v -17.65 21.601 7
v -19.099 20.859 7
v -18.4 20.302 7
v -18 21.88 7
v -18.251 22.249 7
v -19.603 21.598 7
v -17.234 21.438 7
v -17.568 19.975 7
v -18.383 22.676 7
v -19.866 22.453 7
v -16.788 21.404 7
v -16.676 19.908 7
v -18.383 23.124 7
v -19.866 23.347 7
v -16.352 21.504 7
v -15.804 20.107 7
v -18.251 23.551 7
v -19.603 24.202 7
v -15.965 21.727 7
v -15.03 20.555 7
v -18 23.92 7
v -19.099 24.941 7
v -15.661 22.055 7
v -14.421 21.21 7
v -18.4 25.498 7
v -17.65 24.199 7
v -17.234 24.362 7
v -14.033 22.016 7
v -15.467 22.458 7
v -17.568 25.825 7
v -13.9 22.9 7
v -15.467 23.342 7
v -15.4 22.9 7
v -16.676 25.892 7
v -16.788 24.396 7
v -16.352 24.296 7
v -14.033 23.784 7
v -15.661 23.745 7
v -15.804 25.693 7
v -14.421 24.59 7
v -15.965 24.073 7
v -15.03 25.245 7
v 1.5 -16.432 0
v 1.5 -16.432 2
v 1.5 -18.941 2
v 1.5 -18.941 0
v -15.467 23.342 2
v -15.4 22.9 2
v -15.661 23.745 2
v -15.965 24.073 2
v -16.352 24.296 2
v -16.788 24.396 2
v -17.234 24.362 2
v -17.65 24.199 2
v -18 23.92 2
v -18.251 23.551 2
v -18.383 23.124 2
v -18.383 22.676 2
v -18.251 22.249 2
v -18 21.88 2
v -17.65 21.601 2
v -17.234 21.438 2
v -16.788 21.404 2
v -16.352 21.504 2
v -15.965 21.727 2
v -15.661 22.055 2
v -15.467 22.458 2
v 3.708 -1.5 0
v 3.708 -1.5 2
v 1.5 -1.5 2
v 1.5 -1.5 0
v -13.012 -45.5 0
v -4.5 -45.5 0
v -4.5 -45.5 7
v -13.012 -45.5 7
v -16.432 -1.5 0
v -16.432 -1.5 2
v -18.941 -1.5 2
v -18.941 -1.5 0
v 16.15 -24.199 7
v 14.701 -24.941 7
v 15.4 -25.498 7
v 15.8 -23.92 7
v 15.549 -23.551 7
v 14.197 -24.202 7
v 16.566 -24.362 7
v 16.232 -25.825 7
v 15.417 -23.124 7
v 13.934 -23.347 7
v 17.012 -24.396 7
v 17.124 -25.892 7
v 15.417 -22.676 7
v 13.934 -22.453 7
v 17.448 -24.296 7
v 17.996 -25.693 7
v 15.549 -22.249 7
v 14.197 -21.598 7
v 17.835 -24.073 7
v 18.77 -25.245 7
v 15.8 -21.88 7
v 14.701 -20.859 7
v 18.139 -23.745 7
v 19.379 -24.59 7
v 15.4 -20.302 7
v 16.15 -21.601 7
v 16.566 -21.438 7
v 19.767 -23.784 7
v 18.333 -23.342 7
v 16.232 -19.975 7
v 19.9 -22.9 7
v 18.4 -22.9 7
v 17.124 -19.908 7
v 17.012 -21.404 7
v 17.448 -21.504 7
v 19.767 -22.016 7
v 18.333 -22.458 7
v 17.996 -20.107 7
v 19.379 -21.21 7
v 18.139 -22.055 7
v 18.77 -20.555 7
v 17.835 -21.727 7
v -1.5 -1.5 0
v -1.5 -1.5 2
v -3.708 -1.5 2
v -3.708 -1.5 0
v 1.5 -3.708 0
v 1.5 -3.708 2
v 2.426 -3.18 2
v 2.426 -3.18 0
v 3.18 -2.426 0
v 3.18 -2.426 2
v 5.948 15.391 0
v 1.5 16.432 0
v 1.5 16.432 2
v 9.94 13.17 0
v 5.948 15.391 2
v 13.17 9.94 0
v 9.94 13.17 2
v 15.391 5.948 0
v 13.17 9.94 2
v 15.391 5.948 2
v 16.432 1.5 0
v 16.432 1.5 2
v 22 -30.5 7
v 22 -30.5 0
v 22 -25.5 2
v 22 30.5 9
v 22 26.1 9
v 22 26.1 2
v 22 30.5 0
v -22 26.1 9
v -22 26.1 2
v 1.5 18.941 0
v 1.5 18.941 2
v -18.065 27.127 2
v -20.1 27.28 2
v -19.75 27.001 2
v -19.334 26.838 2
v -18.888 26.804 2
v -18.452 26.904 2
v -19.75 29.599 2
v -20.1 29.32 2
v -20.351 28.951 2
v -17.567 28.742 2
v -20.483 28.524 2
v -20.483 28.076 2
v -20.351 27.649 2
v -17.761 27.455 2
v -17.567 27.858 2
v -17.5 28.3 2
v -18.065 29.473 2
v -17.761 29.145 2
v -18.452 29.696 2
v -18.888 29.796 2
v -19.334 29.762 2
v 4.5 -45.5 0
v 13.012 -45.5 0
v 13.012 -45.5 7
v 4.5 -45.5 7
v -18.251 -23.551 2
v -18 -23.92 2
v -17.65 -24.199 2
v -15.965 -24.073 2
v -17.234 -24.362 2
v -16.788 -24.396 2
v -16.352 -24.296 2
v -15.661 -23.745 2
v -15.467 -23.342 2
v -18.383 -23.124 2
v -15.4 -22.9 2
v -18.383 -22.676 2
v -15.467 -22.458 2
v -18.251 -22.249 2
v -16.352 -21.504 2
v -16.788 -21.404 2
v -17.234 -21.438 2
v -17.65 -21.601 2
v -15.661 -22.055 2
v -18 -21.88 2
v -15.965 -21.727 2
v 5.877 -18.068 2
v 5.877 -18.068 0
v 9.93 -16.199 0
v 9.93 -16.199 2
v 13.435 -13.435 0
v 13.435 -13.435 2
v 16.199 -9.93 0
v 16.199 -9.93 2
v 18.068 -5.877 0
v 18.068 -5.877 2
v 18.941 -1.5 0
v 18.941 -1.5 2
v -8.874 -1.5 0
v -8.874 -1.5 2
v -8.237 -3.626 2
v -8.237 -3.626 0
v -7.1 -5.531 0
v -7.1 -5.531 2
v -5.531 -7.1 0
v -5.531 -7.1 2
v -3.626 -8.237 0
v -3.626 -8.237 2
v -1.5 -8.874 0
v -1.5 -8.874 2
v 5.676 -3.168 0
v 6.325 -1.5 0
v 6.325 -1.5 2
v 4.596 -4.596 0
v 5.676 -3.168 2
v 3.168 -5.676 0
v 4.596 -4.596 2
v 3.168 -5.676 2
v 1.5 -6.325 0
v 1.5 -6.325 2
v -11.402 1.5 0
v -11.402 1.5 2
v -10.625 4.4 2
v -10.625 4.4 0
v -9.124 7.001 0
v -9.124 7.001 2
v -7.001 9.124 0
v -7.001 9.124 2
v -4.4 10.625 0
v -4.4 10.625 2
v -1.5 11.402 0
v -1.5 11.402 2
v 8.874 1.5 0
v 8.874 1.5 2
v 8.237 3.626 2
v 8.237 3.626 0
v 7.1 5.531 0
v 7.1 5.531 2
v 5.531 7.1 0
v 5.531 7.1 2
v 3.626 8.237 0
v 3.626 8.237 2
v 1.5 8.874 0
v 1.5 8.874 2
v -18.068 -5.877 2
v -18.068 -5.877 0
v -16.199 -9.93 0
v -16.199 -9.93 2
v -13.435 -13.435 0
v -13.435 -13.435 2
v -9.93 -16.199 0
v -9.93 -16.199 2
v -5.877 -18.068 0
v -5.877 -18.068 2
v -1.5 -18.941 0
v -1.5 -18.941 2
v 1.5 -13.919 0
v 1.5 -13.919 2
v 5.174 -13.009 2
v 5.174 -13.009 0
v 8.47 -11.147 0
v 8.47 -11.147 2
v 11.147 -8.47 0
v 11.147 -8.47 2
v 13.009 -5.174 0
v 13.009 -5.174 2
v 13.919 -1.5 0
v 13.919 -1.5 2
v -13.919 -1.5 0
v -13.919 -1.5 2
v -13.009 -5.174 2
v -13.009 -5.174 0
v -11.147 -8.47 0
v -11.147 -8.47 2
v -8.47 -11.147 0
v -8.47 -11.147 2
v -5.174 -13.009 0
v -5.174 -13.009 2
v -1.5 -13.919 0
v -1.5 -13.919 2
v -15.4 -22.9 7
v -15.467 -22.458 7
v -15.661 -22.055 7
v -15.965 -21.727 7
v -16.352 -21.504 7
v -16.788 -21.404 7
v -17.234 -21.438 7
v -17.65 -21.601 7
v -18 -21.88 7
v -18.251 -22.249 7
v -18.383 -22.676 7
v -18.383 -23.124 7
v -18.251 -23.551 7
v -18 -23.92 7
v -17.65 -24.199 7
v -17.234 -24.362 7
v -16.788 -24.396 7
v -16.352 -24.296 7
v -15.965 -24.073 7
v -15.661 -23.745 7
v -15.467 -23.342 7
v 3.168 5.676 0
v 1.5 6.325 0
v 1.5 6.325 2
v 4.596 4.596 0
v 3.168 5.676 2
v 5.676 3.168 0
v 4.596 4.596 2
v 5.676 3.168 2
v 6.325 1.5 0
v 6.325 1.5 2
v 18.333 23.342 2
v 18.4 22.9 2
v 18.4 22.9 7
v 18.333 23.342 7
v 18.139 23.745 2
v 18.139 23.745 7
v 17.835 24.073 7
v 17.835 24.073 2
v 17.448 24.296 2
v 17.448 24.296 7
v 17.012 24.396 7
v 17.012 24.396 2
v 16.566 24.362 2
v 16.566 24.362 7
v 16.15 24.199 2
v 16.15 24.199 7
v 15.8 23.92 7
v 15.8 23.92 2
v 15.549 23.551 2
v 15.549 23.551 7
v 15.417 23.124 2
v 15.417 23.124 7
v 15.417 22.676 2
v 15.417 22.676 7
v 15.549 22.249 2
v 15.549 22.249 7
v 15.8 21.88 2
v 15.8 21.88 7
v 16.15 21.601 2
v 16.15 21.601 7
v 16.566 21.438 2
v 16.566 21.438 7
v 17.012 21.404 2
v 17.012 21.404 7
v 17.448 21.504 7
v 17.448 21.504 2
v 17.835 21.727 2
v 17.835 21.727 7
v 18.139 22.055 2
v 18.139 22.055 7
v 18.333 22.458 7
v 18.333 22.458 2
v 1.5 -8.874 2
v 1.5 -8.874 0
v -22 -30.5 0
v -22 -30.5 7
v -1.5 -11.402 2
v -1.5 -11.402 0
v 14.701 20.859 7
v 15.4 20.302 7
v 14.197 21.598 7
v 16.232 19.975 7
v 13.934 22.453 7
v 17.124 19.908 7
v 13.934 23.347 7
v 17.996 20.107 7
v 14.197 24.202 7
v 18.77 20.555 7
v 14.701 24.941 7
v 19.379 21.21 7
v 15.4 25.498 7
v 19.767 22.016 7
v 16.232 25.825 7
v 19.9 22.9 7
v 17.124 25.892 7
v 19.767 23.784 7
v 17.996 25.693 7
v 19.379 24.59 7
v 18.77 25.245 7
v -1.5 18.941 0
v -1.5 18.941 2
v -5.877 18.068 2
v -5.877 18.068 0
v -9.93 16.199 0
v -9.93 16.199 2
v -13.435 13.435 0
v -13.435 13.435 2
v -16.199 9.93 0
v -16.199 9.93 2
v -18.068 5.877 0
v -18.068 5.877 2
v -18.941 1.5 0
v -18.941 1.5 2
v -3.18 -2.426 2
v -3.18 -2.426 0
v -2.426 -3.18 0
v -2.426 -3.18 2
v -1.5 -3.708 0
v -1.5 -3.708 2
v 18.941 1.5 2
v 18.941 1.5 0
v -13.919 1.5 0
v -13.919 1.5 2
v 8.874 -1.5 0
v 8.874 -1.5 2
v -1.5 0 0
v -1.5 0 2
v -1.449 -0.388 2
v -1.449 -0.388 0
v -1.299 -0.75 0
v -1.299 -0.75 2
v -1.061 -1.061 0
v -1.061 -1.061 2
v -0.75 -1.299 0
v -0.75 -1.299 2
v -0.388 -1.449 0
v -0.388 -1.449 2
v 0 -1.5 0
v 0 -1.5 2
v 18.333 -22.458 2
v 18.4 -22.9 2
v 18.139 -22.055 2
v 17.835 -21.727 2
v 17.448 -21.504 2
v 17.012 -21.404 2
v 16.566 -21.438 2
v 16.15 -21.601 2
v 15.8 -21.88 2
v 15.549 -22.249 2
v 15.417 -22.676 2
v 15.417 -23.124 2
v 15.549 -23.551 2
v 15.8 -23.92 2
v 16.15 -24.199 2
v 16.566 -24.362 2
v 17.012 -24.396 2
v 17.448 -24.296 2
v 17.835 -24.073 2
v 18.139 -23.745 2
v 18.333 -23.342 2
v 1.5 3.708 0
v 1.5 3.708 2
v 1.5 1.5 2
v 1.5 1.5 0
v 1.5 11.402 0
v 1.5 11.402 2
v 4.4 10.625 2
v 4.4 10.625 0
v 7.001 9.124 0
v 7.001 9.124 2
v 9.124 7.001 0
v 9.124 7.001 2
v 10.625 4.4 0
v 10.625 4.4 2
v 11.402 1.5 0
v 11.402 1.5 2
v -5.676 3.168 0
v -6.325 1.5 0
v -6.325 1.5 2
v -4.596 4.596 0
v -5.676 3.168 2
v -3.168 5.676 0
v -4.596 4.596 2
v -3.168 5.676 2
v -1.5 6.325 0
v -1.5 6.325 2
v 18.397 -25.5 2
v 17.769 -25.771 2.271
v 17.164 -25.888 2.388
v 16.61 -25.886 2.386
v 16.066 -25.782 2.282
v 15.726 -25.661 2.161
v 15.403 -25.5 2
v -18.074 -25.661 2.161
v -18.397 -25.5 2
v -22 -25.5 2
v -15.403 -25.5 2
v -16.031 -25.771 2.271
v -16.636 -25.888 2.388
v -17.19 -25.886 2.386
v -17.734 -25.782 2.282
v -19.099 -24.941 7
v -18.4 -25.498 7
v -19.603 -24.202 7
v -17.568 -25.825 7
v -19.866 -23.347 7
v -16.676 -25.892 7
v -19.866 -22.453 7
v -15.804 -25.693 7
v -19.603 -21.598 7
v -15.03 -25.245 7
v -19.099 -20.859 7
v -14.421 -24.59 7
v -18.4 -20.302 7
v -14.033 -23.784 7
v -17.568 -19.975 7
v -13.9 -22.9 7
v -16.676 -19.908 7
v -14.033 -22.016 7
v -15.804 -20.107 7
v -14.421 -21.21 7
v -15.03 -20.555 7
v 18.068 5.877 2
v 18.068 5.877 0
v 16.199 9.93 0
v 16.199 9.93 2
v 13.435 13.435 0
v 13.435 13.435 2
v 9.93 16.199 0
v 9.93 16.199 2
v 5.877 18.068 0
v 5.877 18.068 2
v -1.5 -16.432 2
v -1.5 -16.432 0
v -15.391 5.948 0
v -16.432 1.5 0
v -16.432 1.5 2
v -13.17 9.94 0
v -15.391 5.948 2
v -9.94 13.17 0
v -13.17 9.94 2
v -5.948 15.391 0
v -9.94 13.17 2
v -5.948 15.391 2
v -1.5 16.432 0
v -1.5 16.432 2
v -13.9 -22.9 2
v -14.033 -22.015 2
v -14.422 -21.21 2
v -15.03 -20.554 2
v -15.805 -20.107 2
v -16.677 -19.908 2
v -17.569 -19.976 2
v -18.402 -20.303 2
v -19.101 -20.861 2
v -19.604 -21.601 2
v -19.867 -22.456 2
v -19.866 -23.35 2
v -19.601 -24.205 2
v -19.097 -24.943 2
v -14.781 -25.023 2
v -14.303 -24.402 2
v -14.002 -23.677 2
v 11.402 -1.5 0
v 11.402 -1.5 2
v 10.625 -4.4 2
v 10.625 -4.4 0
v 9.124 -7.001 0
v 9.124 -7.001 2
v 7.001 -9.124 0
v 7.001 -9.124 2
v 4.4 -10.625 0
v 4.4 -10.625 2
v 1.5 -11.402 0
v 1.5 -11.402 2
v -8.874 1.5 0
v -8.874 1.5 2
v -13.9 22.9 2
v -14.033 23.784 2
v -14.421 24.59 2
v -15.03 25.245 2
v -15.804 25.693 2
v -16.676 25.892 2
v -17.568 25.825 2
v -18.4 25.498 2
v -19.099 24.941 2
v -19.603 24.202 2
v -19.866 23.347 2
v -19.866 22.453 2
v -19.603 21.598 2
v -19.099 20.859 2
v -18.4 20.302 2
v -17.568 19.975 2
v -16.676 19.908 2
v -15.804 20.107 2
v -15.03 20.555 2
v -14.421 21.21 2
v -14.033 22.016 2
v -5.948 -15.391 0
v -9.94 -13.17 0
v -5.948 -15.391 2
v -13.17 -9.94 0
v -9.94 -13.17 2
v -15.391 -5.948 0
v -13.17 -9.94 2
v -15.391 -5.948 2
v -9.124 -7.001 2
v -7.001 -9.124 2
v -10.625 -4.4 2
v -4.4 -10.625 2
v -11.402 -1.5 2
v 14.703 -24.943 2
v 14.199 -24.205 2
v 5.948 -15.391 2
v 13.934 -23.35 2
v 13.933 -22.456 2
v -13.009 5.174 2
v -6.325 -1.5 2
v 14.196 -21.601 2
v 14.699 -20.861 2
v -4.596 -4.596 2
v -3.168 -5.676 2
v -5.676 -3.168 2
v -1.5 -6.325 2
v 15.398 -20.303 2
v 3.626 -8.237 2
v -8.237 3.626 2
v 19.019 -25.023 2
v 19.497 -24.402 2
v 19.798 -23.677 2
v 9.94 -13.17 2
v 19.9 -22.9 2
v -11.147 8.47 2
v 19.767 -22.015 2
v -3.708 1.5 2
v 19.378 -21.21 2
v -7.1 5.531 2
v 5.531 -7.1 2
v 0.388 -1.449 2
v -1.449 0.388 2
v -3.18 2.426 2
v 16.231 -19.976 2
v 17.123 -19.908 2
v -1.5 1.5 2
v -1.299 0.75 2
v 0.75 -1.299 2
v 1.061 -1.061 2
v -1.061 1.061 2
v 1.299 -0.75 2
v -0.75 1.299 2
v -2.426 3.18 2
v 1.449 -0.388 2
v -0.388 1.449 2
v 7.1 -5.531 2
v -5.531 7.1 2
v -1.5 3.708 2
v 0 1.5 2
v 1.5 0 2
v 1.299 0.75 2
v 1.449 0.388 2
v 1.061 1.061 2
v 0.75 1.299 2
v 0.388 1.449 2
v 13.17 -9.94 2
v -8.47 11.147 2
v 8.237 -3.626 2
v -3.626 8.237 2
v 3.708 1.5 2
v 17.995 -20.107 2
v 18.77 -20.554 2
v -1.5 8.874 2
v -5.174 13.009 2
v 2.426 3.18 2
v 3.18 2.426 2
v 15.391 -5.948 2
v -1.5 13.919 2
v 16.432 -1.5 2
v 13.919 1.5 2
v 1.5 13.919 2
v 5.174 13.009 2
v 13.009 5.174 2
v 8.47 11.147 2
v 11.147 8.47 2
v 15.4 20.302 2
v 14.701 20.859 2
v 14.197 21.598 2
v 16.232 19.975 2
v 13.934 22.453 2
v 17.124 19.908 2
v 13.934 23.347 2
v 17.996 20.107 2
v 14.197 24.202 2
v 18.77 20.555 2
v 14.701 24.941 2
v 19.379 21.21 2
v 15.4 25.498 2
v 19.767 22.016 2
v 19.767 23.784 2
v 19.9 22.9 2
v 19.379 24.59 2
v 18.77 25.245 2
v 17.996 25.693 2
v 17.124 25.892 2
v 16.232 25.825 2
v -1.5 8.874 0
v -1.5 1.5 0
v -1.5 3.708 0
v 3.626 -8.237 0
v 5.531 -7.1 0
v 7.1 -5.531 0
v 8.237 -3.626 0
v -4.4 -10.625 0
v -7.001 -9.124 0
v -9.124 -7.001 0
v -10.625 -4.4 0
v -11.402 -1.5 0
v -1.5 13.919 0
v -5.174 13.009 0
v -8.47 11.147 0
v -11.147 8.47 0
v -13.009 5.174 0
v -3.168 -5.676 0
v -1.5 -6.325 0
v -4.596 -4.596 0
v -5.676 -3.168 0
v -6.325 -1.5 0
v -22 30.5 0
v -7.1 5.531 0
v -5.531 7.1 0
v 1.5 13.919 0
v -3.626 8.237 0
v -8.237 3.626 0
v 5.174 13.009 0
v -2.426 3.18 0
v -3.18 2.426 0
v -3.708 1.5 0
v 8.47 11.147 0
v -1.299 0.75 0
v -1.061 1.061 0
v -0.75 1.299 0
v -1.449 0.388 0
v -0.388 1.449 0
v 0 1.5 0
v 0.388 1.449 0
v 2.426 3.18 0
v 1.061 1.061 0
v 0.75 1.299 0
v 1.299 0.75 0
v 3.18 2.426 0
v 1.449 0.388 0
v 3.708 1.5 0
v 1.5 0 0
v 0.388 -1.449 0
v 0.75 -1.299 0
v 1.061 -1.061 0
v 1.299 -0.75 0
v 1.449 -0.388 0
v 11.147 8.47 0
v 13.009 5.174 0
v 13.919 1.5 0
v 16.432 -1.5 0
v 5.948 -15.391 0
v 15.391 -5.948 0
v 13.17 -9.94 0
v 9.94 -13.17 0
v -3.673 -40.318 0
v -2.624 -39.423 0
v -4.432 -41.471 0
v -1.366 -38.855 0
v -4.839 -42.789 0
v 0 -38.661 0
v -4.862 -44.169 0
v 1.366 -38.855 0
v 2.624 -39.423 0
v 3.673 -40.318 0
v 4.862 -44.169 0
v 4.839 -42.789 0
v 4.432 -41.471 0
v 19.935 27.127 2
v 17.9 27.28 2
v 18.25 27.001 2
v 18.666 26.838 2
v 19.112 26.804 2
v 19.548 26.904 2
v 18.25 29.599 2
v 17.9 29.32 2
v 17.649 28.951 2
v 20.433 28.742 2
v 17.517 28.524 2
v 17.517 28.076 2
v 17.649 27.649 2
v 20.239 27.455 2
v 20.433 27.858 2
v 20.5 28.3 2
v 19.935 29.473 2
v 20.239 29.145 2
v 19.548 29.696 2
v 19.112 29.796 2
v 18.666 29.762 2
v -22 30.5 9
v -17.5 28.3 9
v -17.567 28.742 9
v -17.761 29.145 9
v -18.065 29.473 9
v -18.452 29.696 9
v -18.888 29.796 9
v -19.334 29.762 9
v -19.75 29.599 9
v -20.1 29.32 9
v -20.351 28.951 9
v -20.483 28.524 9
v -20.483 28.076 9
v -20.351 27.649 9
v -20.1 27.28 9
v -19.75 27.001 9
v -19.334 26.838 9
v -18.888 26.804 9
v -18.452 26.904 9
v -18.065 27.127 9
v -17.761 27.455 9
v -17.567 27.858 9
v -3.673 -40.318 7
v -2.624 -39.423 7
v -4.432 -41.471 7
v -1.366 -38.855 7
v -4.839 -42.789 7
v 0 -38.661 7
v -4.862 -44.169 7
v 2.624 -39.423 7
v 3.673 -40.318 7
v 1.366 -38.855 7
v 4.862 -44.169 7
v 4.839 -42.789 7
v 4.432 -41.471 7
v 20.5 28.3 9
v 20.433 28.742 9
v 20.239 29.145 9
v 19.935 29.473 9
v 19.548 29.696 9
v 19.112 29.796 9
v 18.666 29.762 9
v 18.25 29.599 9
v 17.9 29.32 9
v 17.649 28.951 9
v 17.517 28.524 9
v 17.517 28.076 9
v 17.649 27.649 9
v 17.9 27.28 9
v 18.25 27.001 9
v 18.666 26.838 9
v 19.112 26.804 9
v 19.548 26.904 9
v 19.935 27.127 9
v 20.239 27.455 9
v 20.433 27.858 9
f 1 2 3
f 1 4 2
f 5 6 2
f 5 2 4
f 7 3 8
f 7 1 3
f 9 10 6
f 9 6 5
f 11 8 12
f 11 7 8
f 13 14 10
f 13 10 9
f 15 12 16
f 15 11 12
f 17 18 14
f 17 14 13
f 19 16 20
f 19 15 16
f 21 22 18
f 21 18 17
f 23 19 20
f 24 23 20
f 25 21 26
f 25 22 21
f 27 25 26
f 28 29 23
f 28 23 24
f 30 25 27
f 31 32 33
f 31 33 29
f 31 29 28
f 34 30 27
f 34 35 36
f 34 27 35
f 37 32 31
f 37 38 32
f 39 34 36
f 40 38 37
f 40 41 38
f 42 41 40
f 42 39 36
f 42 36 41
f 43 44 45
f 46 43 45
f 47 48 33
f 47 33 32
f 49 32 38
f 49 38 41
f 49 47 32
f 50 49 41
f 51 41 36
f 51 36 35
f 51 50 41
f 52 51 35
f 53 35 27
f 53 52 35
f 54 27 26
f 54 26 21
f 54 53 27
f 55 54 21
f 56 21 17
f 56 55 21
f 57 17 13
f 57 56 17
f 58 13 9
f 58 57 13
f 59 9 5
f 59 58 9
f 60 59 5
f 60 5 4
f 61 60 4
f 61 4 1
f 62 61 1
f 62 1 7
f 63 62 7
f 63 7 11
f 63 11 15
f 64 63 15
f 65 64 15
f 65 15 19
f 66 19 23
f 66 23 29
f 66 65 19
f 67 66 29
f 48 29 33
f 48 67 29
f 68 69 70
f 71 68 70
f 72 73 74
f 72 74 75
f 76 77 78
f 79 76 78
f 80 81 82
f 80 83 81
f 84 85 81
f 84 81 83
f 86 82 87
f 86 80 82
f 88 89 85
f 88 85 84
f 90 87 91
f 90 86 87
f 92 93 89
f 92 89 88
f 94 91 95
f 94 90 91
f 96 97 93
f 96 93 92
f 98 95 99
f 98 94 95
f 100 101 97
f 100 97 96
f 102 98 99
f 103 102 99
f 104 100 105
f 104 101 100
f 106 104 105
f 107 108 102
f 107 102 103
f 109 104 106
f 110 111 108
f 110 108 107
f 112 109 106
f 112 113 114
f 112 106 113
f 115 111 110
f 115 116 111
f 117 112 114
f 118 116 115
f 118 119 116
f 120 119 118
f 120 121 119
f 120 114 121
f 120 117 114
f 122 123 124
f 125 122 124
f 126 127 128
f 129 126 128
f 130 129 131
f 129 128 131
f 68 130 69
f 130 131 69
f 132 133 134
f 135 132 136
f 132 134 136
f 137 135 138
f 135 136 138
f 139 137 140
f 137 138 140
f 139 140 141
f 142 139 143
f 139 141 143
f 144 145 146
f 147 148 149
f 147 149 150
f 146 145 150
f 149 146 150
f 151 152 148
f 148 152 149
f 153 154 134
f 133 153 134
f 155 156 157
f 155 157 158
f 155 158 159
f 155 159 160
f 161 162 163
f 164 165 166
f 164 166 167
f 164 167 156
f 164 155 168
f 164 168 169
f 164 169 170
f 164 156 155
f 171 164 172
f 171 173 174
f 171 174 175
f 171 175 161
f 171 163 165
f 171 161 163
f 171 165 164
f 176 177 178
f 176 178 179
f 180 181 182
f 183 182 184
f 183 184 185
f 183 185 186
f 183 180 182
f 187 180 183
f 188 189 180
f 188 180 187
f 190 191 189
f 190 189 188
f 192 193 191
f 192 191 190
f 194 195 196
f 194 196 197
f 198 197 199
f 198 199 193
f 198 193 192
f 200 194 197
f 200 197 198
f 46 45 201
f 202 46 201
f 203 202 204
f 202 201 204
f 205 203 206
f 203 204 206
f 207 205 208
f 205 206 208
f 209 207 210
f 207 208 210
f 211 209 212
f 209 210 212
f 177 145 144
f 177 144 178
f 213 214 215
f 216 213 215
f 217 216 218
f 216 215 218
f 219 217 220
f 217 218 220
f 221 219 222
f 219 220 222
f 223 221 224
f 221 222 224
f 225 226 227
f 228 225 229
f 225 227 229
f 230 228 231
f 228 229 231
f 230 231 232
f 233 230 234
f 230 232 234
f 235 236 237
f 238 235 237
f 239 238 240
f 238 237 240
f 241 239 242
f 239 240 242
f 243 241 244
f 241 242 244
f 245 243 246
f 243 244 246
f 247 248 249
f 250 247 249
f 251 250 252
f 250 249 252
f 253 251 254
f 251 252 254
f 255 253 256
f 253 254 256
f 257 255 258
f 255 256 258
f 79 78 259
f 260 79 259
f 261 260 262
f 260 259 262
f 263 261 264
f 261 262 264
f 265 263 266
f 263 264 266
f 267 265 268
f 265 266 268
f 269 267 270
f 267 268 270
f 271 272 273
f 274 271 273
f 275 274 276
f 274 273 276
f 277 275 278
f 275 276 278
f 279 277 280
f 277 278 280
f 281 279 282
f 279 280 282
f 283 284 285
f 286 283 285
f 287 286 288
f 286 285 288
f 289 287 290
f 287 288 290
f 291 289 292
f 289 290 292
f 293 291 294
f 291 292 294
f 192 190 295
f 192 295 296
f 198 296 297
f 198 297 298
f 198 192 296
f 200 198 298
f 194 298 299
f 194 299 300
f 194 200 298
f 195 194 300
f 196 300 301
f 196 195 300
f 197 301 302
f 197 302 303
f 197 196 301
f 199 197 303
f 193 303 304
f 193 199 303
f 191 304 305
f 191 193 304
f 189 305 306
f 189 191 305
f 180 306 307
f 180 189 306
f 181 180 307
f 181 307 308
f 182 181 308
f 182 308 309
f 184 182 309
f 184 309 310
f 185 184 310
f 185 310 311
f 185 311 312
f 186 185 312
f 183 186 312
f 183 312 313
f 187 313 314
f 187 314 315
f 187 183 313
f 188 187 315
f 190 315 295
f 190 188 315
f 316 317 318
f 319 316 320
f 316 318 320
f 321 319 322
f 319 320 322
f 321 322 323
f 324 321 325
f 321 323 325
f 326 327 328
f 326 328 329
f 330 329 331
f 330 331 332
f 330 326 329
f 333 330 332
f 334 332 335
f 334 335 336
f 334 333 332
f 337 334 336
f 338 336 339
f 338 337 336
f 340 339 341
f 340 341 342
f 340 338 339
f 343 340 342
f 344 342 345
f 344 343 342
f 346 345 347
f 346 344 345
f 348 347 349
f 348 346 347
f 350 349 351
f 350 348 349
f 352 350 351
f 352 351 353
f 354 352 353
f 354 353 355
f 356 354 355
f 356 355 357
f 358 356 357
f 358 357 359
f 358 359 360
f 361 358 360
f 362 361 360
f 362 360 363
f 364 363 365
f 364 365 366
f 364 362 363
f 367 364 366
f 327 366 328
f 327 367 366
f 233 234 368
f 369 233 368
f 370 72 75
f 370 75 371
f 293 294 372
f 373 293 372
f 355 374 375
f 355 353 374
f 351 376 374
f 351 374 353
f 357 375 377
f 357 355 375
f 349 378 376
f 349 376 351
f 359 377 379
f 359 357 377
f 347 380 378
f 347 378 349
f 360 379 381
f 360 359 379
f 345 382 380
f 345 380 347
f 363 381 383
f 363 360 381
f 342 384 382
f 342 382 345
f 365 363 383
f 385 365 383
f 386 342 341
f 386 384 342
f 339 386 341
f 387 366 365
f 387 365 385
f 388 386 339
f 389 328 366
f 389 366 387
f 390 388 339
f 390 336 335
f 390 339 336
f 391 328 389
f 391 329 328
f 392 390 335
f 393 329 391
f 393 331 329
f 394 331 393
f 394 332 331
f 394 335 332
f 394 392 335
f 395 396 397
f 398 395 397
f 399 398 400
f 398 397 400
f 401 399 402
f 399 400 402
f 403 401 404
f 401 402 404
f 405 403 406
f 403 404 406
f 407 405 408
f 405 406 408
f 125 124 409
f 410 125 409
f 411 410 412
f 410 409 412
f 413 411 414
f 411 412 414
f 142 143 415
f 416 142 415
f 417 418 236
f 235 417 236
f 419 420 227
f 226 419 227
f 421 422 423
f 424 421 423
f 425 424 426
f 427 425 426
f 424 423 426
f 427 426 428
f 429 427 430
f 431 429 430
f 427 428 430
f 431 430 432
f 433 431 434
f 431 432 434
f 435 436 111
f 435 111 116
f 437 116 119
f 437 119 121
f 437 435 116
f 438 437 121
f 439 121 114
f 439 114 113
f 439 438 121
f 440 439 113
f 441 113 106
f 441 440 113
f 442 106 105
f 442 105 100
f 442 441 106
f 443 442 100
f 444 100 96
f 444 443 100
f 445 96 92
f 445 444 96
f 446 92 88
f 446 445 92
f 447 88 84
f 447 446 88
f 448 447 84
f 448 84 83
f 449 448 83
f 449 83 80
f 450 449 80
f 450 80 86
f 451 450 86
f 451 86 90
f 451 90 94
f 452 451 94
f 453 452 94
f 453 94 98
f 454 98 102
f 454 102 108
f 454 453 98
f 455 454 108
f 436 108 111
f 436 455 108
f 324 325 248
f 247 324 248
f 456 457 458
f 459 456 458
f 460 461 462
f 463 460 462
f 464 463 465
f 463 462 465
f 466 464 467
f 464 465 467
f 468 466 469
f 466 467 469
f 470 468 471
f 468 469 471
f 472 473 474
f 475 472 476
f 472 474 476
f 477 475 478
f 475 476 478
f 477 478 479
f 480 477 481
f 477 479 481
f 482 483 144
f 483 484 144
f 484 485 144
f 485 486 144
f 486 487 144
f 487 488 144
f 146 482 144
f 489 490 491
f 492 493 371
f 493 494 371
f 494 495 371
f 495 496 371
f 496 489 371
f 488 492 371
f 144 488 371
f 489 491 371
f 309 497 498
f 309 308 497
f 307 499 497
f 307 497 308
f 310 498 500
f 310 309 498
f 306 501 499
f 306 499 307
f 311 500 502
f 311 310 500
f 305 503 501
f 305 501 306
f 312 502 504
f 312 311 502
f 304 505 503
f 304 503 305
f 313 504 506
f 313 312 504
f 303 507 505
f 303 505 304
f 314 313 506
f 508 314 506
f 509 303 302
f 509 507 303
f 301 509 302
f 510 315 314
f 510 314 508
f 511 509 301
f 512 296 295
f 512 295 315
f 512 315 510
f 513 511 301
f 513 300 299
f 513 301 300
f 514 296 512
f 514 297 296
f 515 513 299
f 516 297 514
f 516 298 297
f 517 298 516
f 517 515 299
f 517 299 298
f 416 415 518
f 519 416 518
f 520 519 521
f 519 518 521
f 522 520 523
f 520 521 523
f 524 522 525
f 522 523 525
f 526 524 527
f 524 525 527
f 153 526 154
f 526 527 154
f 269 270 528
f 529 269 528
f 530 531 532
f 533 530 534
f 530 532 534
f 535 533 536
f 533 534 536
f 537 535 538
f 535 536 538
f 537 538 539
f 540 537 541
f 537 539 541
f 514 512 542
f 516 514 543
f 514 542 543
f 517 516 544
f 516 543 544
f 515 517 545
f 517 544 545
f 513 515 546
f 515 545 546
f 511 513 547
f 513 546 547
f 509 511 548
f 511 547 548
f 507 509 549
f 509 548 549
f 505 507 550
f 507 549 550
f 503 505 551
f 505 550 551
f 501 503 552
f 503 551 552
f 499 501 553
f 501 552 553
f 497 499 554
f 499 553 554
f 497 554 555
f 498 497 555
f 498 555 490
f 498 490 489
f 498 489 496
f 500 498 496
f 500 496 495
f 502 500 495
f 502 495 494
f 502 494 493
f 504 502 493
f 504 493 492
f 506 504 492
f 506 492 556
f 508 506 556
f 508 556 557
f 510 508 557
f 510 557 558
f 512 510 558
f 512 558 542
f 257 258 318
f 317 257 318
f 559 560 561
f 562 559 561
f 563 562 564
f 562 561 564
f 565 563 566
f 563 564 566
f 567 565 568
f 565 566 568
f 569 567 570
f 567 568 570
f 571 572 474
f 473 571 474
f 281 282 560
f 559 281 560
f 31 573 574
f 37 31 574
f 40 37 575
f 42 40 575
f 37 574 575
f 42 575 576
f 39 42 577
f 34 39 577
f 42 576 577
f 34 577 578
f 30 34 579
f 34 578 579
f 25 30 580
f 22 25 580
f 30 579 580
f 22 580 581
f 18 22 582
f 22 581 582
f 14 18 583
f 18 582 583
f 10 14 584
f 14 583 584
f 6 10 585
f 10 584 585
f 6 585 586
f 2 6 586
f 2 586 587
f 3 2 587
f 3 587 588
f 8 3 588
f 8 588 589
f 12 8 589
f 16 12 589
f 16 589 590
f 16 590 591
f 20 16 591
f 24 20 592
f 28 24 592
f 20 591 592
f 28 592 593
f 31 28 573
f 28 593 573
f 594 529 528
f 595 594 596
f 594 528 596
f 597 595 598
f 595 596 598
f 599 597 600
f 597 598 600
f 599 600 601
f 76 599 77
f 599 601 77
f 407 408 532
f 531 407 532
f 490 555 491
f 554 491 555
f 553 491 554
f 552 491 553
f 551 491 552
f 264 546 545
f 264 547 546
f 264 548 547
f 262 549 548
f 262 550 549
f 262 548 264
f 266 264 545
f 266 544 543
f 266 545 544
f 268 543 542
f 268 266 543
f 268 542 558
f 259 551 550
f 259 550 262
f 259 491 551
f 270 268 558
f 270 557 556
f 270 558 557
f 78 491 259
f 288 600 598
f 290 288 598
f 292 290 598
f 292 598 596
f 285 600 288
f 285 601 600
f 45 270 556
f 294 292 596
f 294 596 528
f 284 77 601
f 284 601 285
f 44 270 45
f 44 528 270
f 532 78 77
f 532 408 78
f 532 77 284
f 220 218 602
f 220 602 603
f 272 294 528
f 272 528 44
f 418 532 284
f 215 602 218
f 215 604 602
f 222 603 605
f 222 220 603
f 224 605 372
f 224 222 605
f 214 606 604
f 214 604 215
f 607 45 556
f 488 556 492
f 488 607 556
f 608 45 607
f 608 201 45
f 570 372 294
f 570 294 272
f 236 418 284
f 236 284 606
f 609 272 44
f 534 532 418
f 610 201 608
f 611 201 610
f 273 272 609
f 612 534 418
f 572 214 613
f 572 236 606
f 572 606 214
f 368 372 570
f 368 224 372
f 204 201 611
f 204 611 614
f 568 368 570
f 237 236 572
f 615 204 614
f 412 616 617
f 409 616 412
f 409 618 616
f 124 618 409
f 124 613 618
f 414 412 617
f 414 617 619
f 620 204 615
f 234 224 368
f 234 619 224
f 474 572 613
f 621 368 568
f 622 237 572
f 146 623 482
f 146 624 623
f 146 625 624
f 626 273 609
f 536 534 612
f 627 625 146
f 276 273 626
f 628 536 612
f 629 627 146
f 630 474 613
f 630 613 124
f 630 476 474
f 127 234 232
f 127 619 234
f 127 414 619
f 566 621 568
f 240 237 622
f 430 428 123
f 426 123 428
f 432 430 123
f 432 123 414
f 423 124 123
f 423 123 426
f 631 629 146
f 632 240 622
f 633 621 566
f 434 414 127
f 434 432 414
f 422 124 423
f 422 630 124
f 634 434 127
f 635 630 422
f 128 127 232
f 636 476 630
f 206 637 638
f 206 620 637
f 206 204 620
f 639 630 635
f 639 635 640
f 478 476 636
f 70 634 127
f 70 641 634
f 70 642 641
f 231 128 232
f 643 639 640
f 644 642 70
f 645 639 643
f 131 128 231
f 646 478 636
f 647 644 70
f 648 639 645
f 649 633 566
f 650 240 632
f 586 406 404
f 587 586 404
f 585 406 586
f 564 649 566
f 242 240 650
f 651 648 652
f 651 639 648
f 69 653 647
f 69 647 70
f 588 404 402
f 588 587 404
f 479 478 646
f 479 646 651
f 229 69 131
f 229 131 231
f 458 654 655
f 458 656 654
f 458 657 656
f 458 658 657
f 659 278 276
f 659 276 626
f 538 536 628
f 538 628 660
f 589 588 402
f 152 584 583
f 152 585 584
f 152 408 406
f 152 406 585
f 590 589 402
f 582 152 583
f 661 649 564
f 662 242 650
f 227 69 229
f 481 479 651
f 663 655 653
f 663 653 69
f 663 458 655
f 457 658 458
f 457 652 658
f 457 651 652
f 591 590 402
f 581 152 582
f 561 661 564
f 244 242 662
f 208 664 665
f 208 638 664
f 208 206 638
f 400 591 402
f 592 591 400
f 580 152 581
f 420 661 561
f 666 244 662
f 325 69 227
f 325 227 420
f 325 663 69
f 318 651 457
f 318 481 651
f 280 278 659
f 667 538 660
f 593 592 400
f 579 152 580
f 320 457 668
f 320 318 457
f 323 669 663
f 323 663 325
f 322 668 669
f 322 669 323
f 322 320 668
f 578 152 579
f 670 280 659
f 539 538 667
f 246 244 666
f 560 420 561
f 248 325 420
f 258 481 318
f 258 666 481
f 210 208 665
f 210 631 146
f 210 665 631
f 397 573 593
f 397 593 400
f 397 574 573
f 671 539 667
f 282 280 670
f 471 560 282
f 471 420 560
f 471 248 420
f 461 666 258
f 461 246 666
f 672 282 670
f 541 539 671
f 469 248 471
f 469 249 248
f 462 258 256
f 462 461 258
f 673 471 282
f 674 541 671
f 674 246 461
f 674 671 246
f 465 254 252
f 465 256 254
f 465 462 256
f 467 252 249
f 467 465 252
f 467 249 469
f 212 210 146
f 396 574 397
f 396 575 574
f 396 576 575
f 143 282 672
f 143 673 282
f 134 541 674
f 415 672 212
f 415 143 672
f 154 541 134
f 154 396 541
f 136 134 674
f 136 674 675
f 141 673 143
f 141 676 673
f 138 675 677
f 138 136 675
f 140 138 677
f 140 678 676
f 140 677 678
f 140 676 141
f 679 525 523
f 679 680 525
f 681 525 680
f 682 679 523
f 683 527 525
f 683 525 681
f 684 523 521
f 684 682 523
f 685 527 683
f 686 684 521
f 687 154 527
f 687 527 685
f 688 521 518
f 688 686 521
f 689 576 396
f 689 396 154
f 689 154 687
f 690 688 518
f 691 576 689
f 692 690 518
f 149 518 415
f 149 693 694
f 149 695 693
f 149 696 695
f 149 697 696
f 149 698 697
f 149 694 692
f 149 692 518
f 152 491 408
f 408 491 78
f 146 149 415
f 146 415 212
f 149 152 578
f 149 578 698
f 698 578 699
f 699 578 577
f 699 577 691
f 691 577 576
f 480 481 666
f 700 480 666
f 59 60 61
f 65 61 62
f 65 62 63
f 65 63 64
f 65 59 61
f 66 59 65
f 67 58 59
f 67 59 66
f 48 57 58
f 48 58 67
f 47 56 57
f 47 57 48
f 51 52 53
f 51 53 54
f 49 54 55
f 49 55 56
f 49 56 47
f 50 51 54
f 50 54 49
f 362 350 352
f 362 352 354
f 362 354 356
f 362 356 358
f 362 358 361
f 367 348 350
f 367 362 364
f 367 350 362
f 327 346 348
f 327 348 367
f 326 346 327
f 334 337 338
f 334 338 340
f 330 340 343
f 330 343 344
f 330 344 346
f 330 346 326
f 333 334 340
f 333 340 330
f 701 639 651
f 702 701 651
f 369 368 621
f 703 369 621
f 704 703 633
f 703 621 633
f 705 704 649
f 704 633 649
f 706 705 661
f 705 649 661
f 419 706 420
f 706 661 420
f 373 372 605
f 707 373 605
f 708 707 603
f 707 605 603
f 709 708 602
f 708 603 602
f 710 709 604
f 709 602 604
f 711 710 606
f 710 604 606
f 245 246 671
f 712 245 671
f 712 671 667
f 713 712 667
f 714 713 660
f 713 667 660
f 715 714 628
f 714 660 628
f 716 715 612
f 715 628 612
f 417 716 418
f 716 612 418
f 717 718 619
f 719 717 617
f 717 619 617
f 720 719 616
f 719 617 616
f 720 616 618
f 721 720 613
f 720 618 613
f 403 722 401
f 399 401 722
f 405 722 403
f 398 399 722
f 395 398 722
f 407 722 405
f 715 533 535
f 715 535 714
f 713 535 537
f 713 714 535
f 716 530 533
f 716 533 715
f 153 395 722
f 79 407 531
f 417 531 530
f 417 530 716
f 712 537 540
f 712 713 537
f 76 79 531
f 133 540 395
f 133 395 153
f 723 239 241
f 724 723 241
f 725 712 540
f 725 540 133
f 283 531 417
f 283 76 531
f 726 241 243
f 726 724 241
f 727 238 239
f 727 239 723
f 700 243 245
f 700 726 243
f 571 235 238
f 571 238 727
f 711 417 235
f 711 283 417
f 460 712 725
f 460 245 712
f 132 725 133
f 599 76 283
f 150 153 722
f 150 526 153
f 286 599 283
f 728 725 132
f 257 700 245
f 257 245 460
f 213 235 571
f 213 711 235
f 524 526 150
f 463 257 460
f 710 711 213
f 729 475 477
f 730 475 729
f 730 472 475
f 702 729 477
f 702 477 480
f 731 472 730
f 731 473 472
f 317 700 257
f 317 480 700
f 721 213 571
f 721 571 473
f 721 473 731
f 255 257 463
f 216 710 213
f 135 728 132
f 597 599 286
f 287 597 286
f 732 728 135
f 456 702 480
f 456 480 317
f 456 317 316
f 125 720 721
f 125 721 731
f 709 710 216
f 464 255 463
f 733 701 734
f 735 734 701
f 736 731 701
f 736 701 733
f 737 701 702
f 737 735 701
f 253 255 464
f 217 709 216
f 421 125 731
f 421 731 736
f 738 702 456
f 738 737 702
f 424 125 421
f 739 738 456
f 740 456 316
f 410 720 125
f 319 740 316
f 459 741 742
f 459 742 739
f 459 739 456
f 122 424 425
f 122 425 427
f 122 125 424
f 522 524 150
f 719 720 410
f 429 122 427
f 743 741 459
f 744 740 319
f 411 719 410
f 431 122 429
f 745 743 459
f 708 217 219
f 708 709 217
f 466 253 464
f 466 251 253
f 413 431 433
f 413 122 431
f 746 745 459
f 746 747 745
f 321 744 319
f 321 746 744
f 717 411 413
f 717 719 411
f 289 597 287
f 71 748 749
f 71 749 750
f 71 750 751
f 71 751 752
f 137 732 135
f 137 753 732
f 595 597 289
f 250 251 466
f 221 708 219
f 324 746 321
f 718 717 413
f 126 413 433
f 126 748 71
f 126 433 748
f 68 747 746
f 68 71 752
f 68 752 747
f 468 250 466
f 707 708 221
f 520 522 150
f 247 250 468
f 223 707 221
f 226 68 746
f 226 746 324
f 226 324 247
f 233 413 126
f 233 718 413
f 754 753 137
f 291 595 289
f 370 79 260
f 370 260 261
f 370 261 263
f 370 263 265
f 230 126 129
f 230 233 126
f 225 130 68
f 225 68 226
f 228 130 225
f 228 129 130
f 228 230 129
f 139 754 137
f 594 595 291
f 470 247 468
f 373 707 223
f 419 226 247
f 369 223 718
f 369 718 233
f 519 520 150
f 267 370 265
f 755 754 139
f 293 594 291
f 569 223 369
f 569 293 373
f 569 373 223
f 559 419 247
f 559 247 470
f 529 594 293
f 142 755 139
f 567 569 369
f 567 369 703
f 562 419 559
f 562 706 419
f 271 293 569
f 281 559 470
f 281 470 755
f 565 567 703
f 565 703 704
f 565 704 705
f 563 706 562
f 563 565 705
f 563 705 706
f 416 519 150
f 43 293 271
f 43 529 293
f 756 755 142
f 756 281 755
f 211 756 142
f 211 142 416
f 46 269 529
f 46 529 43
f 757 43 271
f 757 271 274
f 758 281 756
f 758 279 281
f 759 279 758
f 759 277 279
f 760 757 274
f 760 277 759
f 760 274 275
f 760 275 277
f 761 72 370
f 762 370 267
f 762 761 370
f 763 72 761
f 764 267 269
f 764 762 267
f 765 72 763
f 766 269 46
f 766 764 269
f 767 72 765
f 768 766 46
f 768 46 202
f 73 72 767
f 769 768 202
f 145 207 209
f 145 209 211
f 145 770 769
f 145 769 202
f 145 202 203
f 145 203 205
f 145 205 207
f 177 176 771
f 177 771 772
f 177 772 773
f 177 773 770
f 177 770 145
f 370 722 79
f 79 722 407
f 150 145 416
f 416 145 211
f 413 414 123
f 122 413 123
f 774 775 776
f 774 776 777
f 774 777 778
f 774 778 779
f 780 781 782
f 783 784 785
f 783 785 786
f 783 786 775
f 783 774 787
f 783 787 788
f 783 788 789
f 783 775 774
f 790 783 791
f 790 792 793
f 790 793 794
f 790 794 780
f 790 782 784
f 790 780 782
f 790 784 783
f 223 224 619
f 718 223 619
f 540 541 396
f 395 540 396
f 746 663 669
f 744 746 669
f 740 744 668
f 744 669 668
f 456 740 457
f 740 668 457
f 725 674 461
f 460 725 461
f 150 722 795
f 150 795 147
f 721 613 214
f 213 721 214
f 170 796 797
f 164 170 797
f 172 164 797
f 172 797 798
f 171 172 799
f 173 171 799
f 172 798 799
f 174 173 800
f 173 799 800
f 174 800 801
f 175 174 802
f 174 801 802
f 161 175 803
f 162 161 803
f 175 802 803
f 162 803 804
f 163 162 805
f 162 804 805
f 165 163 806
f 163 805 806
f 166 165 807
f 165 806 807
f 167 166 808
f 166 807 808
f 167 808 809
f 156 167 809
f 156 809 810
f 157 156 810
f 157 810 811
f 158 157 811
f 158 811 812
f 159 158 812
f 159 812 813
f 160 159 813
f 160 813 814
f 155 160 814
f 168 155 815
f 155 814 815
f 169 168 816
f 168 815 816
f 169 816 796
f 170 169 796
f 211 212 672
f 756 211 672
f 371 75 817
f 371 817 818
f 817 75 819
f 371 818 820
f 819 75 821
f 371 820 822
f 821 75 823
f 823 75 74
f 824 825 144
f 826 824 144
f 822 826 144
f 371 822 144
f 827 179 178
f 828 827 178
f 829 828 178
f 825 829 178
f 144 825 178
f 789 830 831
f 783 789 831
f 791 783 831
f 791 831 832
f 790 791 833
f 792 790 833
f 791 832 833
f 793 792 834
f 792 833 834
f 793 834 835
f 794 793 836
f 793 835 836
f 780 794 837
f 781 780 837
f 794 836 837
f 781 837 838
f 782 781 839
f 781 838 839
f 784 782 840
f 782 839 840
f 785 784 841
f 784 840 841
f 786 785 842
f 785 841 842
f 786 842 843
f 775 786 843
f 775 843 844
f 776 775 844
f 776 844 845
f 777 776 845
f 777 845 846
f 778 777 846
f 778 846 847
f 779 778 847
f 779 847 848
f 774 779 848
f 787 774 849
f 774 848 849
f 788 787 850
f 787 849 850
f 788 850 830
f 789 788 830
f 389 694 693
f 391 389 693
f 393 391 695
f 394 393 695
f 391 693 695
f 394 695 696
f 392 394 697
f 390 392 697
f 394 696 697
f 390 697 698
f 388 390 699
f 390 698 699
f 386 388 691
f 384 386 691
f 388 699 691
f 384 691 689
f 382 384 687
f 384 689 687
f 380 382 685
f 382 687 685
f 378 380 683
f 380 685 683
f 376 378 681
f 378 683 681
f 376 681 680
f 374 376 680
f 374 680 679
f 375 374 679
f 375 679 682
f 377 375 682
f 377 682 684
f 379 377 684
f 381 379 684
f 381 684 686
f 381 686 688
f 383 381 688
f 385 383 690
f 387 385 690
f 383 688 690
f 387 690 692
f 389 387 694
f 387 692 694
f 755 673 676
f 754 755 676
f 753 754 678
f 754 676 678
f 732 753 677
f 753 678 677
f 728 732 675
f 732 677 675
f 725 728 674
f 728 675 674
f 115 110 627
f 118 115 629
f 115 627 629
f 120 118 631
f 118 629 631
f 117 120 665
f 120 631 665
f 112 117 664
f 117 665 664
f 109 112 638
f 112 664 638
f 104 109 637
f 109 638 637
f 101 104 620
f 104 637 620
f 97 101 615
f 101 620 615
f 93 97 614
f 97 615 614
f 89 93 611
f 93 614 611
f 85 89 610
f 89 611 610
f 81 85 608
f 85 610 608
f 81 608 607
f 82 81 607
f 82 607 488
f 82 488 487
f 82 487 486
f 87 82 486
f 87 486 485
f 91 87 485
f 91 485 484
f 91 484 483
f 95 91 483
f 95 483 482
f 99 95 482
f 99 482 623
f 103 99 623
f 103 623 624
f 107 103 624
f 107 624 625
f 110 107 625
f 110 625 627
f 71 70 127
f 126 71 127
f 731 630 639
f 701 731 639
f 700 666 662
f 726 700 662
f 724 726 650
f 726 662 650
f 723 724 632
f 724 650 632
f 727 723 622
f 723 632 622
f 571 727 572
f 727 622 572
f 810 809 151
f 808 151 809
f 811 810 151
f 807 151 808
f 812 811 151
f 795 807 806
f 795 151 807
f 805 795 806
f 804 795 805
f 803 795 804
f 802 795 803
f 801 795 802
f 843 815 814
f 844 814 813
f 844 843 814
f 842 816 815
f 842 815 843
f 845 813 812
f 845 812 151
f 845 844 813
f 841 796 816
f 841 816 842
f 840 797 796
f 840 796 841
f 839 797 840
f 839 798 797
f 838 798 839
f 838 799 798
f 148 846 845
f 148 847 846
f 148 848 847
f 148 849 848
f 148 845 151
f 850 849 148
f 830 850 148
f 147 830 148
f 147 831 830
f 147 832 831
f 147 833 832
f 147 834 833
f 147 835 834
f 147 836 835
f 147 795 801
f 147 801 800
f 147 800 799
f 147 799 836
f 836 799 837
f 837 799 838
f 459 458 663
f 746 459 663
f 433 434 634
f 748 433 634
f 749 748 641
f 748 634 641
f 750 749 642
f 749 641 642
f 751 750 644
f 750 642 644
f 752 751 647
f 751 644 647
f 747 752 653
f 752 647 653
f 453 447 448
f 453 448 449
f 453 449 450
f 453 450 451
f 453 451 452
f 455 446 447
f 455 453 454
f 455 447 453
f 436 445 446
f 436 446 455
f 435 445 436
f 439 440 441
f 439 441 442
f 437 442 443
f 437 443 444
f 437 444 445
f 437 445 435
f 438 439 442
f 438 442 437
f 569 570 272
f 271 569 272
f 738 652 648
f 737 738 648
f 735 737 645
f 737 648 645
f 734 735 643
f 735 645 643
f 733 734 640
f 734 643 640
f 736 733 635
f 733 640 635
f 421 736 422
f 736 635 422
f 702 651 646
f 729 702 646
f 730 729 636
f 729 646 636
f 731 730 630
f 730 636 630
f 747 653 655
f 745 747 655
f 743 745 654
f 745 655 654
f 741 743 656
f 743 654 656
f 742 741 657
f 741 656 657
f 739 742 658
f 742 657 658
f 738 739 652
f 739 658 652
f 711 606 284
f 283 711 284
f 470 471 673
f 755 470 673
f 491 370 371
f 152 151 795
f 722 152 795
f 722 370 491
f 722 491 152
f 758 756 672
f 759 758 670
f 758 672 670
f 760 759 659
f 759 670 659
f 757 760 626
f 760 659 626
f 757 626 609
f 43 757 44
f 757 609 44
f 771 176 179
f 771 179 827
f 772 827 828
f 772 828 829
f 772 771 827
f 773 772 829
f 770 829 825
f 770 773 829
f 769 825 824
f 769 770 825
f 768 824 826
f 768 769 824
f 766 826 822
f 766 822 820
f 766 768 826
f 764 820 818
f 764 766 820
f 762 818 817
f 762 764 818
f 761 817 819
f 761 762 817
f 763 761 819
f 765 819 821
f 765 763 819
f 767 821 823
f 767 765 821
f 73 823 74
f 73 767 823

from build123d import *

# Parameters (mm, degrees)
F0_W        = 44
F0_H        = 61
F1_DEPTH    = 2
F3_DEPTH    = 7
F4_R        = 3
F4_R_2      = 1.5
F5_DEPTH    = 5
F6_T4_DEPTH = 44
F7_W        = 44
F7_H        = 4.4
F8_DEPTH    = 7
F9_R        = 1.5
F10_DEPTH   = 7
F12_DEPTH   = 2.001


# Not quite as in the source:
# - a fillet or chamfer that OpenCascade refuses, or shapes differently, is made with other operations: its cross-section is extruded or revolved along the edge and cut away or added


with BuildPart() as f1:
    # F0 (on Top) → F1 (new body)
    with BuildSketch(Plane.XY):
        Rectangle(F0_W, F0_H)
    extrude(amount=F1_DEPTH)

    # F2 (on face) → F3 (join)
    with BuildSketch(Plane(origin=(0, 0, 0), x_dir=(1, 0, 0), z_dir=(0, 0, -1))):
        with BuildLine():
            Line((-13.0117940697, 45.5), (-22, 30.5))
            Line((-22, 30.5), (22, 30.5))
            Line((22, 30.5), (13.0117940697, 45.5))
            Line((13.0117940697, 45.5), (4.5, 45.5))
            ThreePointArc((4.5, 45.5), (0, 38.660928057), (-4.5, 45.5))
            Line((-4.5, 45.5), (-13.0117940697, 45.5))
        make_face()
    extrude(amount=-F3_DEPTH)

    # F4 (on face) → F5 (join)
    with BuildSketch(Plane.XY.offset(2)):
        with Locations((-16.9, 22.9)):
            Circle(F4_R)
        with Locations((-16.9, 22.9)):
            Circle(F4_R_2, mode=Mode.SUBTRACT)
        with Locations((16.9, 22.9)):
            Circle(F4_R)
        with Locations((16.9, 22.9)):
            Circle(F4_R_2, mode=Mode.SUBTRACT)
        with Locations((16.9, -22.9)):
            Circle(F4_R)
        with Locations((16.9, -22.9)):
            Circle(F4_R_2, mode=Mode.SUBTRACT)
        with Locations((-16.9, -22.9)):
            Circle(F4_R)
        with Locations((-16.9, -22.9)):
            Circle(F4_R_2, mode=Mode.SUBTRACT)
    extrude(amount=F5_DEPTH)

    # F6: chamfer of 5 on 1 edges, made by hand


with BuildPart() as f6_tool2:
    # F6_s3 → F6_t4 (new body)
    with BuildSketch(Plane.YZ.offset(-22)):
        Polygon((-25.5, 2), (-30.5, 7), (-30.5, 2), align=None)
    extrude(amount=F6_T4_DEPTH)

    split(bisect_by=Plane(origin=(29.6352662025, -17.7578583619, 0), x_dir=(0, 0, 1), z_dir=(-0.8577903364, 0.5139997459, 0)), keep=Keep.TOP)

    split(bisect_by=Plane.XY.offset(7), keep=Keep.BOTTOM)

    split(bisect_by=Plane(origin=(-29.6352662025, -17.7578583619, 0), x_dir=(0, 0, 1), z_dir=(0.8577903364, 0.5139997459, 0)), keep=Keep.TOP)


with BuildPart() as f1_1:
    add(f1.part)

    # F6_t1: union F6_tool2
    add(f6_tool2.part)

    # F7 (on face) → F8 (join)
    with BuildSketch(Plane.XY.offset(2)):
        with Locations((0, 28.3)):
            Rectangle(F7_W, F7_H)
    extrude(amount=F8_DEPTH)

    # F9 (on face) → F10 (cut)
    with BuildSketch(Plane.XY.offset(9)):
        with Locations((-19, 28.3)):
            Circle(F9_R)
        with Locations((19, 28.3)):
            Circle(F9_R)
    extrude(amount=-F10_DEPTH, mode=Mode.SUBTRACT)

    # F11 (on face) → F12 (cut, through all)
    with BuildSketch(Plane.XY.offset(2)):
        with BuildLine():
            Line((16.4316767252, 1.5), (18.9406969249, 1.5))
            ThreePointArc((18.9406969249, 1.5), (13.4350288425, 13.4350288425), (1.5, 18.9406969249))
            Line((1.5, 18.9406969249), (1.5, 16.4316767252))
            ThreePointArc((1.5, 16.4316767252), (11.6672618896, 11.6672618896), (16.4316767252, 1.5))
        make_face()
        with BuildLine():
            ThreePointArc((1.5, -18.9406969249), (13.4350288425, -13.4350288425), (18.9406969249, -1.5))
            Line((18.9406969249, -1.5), (16.4316767252, -1.5))
            ThreePointArc((16.4316767252, -1.5), (11.6672618896, -11.6672618896), (1.5, -16.4316767252))
            Line((1.5, -16.4316767252), (1.5, -18.9406969249))
        make_face()
        with BuildLine():
            Line((-1.5, 16.4316767252), (-1.5, 18.9406969249))
            ThreePointArc((-1.5, 18.9406969249), (-13.4350288425, 13.4350288425), (-18.9406969249, 1.5))
            Line((-18.9406969249, 1.5), (-16.4316767252, 1.5))
            ThreePointArc((-16.4316767252, 1.5), (-11.6672618896, 11.6672618896), (-1.5, 16.4316767252))
        make_face()
        with BuildLine():
            Line((11.401754251, 1.5), (13.9194109071, 1.5))
            ThreePointArc((13.9194109071, 1.5), (9.8994949366, 9.8994949366), (1.5, 13.9194109071))
            Line((1.5, 13.9194109071), (1.5, 11.401754251))
            ThreePointArc((1.5, 11.401754251), (8.1317279836, 8.1317279836), (11.401754251, 1.5))
        make_face()
        with BuildLine():
            ThreePointArc((-18.9406969249, -1.5), (-13.4350288425, -13.4350288425), (-1.5, -18.9406969249))
            Line((-1.5, -18.9406969249), (-1.5, -16.4316767252))
            ThreePointArc((-1.5, -16.4316767252), (-11.6672618896, -11.6672618896), (-16.4316767252, -1.5))
            Line((-16.4316767252, -1.5), (-18.9406969249, -1.5))
        make_face()
        with BuildLine():
            ThreePointArc((1.5, -13.9194109071), (9.8994949366, -9.8994949366), (13.9194109071, -1.5))
            Line((13.9194109071, -1.5), (11.401754251, -1.5))
            ThreePointArc((11.401754251, -1.5), (8.1317279836, -8.1317279836), (1.5, -11.401754251))
            Line((1.5, -11.401754251), (1.5, -13.9194109071))
        make_face()
        with BuildLine():
            Line((-1.5, 11.401754251), (-1.5, 13.9194109071))
            ThreePointArc((-1.5, 13.9194109071), (-9.8994949366, 9.8994949366), (-13.9194109071, 1.5))
            Line((-13.9194109071, 1.5), (-11.401754251, 1.5))
            ThreePointArc((-11.401754251, 1.5), (-8.1317279836, 8.1317279836), (-1.5, 11.401754251))
        make_face()
        with BuildLine():
            Line((6.3245553203, 1.5), (8.8741196746, 1.5))
            ThreePointArc((8.8741196746, 1.5), (6.3639610307, 6.3639610307), (1.5, 8.8741196746))
            Line((1.5, 8.8741196746), (1.5, 6.3245553203))
            ThreePointArc((1.5, 6.3245553203), (4.5961940777, 4.5961940777), (6.3245553203, 1.5))
        make_face()
        with BuildLine():
            ThreePointArc((-13.9194109071, -1.5), (-9.8994949366, -9.8994949366), (-1.5, -13.9194109071))
            Line((-1.5, -13.9194109071), (-1.5, -11.401754251))
            ThreePointArc((-1.5, -11.401754251), (-8.1317279836, -8.1317279836), (-11.401754251, -1.5))
            Line((-11.401754251, -1.5), (-13.9194109071, -1.5))
        make_face()
        with BuildLine():
            ThreePointArc((1.5, -8.8741196746), (6.3639610307, -6.3639610307), (8.8741196746, -1.5))
            Line((8.8741196746, -1.5), (6.3245553203, -1.5))
            ThreePointArc((6.3245553203, -1.5), (4.5961940777, -4.5961940777), (1.5, -6.3245553203))
            Line((1.5, -6.3245553203), (1.5, -8.8741196746))
        make_face()
        with BuildLine():
            Line((-1.5, 6.3245553203), (-1.5, 8.8741196746))
            ThreePointArc((-1.5, 8.8741196746), (-6.3639610307, 6.3639610307), (-8.8741196746, 1.5))
            Line((-8.8741196746, 1.5), (-6.3245553203, 1.5))
            ThreePointArc((-6.3245553203, 1.5), (-4.5961940777, 4.5961940777), (-1.5, 6.3245553203))
        make_face()
        with BuildLine():
            Line((1.5, 1.5), (3.7080992435, 1.5))
            ThreePointArc((3.7080992435, 1.5), (2.8284271247, 2.8284271247), (1.5, 3.7080992435))
            Line((1.5, 3.7080992435), (1.5, 1.5))
        make_face()
        with BuildLine():
            ThreePointArc((-8.8741196746, -1.5), (-6.3639610307, -6.3639610307), (-1.5, -8.8741196746))
            Line((-1.5, -8.8741196746), (-1.5, -6.3245553203))
            ThreePointArc((-1.5, -6.3245553203), (-4.5961940777, -4.5961940777), (-6.3245553203, -1.5))
            Line((-6.3245553203, -1.5), (-8.8741196746, -1.5))
        make_face()
        with BuildLine():
            ThreePointArc((1.5, -3.7080992435), (2.8284271247, -2.8284271247), (3.7080992435, -1.5))
            Line((3.7080992435, -1.5), (1.5, -1.5))
            Line((1.5, -1.5), (1.5, -3.7080992435))
        make_face()
        with BuildLine():
            Line((-1.5, 1.5), (-1.5, 3.7080992435))
            ThreePointArc((-1.5, 3.7080992435), (-2.8284271247, 2.8284271247), (-3.7080992435, 1.5))
            Line((-3.7080992435, 1.5), (-1.5, 1.5))
        make_face()
        with BuildLine():
            ThreePointArc((-1.03e-08, -1.5), (1.0606601681, -1.0606601754), (1.5, 0))
            ThreePointArc((1.5, 0), (1.0606601718, 1.0606601718), (0, 1.5))
            ThreePointArc((0, 1.5), (-1.0606601711, 1.0606601725), (-1.5, 2e-09))
            ThreePointArc((-1.5, 2e-09), (-1.0606601761, -1.0606601674), (-1.03e-08, -1.5))
        make_face()
        with BuildLine():
            ThreePointArc((-3.7080992435, -1.5), (-2.8284271247, -2.8284271247), (-1.5, -3.7080992435))
            Line((-1.5, -3.7080992435), (-1.5, -1.5))
            Line((-1.5, -1.5), (-3.7080992435, -1.5))
        make_face()
    extrude(amount=-F12_DEPTH, mode=Mode.SUBTRACT)


solid = f1_1.part
